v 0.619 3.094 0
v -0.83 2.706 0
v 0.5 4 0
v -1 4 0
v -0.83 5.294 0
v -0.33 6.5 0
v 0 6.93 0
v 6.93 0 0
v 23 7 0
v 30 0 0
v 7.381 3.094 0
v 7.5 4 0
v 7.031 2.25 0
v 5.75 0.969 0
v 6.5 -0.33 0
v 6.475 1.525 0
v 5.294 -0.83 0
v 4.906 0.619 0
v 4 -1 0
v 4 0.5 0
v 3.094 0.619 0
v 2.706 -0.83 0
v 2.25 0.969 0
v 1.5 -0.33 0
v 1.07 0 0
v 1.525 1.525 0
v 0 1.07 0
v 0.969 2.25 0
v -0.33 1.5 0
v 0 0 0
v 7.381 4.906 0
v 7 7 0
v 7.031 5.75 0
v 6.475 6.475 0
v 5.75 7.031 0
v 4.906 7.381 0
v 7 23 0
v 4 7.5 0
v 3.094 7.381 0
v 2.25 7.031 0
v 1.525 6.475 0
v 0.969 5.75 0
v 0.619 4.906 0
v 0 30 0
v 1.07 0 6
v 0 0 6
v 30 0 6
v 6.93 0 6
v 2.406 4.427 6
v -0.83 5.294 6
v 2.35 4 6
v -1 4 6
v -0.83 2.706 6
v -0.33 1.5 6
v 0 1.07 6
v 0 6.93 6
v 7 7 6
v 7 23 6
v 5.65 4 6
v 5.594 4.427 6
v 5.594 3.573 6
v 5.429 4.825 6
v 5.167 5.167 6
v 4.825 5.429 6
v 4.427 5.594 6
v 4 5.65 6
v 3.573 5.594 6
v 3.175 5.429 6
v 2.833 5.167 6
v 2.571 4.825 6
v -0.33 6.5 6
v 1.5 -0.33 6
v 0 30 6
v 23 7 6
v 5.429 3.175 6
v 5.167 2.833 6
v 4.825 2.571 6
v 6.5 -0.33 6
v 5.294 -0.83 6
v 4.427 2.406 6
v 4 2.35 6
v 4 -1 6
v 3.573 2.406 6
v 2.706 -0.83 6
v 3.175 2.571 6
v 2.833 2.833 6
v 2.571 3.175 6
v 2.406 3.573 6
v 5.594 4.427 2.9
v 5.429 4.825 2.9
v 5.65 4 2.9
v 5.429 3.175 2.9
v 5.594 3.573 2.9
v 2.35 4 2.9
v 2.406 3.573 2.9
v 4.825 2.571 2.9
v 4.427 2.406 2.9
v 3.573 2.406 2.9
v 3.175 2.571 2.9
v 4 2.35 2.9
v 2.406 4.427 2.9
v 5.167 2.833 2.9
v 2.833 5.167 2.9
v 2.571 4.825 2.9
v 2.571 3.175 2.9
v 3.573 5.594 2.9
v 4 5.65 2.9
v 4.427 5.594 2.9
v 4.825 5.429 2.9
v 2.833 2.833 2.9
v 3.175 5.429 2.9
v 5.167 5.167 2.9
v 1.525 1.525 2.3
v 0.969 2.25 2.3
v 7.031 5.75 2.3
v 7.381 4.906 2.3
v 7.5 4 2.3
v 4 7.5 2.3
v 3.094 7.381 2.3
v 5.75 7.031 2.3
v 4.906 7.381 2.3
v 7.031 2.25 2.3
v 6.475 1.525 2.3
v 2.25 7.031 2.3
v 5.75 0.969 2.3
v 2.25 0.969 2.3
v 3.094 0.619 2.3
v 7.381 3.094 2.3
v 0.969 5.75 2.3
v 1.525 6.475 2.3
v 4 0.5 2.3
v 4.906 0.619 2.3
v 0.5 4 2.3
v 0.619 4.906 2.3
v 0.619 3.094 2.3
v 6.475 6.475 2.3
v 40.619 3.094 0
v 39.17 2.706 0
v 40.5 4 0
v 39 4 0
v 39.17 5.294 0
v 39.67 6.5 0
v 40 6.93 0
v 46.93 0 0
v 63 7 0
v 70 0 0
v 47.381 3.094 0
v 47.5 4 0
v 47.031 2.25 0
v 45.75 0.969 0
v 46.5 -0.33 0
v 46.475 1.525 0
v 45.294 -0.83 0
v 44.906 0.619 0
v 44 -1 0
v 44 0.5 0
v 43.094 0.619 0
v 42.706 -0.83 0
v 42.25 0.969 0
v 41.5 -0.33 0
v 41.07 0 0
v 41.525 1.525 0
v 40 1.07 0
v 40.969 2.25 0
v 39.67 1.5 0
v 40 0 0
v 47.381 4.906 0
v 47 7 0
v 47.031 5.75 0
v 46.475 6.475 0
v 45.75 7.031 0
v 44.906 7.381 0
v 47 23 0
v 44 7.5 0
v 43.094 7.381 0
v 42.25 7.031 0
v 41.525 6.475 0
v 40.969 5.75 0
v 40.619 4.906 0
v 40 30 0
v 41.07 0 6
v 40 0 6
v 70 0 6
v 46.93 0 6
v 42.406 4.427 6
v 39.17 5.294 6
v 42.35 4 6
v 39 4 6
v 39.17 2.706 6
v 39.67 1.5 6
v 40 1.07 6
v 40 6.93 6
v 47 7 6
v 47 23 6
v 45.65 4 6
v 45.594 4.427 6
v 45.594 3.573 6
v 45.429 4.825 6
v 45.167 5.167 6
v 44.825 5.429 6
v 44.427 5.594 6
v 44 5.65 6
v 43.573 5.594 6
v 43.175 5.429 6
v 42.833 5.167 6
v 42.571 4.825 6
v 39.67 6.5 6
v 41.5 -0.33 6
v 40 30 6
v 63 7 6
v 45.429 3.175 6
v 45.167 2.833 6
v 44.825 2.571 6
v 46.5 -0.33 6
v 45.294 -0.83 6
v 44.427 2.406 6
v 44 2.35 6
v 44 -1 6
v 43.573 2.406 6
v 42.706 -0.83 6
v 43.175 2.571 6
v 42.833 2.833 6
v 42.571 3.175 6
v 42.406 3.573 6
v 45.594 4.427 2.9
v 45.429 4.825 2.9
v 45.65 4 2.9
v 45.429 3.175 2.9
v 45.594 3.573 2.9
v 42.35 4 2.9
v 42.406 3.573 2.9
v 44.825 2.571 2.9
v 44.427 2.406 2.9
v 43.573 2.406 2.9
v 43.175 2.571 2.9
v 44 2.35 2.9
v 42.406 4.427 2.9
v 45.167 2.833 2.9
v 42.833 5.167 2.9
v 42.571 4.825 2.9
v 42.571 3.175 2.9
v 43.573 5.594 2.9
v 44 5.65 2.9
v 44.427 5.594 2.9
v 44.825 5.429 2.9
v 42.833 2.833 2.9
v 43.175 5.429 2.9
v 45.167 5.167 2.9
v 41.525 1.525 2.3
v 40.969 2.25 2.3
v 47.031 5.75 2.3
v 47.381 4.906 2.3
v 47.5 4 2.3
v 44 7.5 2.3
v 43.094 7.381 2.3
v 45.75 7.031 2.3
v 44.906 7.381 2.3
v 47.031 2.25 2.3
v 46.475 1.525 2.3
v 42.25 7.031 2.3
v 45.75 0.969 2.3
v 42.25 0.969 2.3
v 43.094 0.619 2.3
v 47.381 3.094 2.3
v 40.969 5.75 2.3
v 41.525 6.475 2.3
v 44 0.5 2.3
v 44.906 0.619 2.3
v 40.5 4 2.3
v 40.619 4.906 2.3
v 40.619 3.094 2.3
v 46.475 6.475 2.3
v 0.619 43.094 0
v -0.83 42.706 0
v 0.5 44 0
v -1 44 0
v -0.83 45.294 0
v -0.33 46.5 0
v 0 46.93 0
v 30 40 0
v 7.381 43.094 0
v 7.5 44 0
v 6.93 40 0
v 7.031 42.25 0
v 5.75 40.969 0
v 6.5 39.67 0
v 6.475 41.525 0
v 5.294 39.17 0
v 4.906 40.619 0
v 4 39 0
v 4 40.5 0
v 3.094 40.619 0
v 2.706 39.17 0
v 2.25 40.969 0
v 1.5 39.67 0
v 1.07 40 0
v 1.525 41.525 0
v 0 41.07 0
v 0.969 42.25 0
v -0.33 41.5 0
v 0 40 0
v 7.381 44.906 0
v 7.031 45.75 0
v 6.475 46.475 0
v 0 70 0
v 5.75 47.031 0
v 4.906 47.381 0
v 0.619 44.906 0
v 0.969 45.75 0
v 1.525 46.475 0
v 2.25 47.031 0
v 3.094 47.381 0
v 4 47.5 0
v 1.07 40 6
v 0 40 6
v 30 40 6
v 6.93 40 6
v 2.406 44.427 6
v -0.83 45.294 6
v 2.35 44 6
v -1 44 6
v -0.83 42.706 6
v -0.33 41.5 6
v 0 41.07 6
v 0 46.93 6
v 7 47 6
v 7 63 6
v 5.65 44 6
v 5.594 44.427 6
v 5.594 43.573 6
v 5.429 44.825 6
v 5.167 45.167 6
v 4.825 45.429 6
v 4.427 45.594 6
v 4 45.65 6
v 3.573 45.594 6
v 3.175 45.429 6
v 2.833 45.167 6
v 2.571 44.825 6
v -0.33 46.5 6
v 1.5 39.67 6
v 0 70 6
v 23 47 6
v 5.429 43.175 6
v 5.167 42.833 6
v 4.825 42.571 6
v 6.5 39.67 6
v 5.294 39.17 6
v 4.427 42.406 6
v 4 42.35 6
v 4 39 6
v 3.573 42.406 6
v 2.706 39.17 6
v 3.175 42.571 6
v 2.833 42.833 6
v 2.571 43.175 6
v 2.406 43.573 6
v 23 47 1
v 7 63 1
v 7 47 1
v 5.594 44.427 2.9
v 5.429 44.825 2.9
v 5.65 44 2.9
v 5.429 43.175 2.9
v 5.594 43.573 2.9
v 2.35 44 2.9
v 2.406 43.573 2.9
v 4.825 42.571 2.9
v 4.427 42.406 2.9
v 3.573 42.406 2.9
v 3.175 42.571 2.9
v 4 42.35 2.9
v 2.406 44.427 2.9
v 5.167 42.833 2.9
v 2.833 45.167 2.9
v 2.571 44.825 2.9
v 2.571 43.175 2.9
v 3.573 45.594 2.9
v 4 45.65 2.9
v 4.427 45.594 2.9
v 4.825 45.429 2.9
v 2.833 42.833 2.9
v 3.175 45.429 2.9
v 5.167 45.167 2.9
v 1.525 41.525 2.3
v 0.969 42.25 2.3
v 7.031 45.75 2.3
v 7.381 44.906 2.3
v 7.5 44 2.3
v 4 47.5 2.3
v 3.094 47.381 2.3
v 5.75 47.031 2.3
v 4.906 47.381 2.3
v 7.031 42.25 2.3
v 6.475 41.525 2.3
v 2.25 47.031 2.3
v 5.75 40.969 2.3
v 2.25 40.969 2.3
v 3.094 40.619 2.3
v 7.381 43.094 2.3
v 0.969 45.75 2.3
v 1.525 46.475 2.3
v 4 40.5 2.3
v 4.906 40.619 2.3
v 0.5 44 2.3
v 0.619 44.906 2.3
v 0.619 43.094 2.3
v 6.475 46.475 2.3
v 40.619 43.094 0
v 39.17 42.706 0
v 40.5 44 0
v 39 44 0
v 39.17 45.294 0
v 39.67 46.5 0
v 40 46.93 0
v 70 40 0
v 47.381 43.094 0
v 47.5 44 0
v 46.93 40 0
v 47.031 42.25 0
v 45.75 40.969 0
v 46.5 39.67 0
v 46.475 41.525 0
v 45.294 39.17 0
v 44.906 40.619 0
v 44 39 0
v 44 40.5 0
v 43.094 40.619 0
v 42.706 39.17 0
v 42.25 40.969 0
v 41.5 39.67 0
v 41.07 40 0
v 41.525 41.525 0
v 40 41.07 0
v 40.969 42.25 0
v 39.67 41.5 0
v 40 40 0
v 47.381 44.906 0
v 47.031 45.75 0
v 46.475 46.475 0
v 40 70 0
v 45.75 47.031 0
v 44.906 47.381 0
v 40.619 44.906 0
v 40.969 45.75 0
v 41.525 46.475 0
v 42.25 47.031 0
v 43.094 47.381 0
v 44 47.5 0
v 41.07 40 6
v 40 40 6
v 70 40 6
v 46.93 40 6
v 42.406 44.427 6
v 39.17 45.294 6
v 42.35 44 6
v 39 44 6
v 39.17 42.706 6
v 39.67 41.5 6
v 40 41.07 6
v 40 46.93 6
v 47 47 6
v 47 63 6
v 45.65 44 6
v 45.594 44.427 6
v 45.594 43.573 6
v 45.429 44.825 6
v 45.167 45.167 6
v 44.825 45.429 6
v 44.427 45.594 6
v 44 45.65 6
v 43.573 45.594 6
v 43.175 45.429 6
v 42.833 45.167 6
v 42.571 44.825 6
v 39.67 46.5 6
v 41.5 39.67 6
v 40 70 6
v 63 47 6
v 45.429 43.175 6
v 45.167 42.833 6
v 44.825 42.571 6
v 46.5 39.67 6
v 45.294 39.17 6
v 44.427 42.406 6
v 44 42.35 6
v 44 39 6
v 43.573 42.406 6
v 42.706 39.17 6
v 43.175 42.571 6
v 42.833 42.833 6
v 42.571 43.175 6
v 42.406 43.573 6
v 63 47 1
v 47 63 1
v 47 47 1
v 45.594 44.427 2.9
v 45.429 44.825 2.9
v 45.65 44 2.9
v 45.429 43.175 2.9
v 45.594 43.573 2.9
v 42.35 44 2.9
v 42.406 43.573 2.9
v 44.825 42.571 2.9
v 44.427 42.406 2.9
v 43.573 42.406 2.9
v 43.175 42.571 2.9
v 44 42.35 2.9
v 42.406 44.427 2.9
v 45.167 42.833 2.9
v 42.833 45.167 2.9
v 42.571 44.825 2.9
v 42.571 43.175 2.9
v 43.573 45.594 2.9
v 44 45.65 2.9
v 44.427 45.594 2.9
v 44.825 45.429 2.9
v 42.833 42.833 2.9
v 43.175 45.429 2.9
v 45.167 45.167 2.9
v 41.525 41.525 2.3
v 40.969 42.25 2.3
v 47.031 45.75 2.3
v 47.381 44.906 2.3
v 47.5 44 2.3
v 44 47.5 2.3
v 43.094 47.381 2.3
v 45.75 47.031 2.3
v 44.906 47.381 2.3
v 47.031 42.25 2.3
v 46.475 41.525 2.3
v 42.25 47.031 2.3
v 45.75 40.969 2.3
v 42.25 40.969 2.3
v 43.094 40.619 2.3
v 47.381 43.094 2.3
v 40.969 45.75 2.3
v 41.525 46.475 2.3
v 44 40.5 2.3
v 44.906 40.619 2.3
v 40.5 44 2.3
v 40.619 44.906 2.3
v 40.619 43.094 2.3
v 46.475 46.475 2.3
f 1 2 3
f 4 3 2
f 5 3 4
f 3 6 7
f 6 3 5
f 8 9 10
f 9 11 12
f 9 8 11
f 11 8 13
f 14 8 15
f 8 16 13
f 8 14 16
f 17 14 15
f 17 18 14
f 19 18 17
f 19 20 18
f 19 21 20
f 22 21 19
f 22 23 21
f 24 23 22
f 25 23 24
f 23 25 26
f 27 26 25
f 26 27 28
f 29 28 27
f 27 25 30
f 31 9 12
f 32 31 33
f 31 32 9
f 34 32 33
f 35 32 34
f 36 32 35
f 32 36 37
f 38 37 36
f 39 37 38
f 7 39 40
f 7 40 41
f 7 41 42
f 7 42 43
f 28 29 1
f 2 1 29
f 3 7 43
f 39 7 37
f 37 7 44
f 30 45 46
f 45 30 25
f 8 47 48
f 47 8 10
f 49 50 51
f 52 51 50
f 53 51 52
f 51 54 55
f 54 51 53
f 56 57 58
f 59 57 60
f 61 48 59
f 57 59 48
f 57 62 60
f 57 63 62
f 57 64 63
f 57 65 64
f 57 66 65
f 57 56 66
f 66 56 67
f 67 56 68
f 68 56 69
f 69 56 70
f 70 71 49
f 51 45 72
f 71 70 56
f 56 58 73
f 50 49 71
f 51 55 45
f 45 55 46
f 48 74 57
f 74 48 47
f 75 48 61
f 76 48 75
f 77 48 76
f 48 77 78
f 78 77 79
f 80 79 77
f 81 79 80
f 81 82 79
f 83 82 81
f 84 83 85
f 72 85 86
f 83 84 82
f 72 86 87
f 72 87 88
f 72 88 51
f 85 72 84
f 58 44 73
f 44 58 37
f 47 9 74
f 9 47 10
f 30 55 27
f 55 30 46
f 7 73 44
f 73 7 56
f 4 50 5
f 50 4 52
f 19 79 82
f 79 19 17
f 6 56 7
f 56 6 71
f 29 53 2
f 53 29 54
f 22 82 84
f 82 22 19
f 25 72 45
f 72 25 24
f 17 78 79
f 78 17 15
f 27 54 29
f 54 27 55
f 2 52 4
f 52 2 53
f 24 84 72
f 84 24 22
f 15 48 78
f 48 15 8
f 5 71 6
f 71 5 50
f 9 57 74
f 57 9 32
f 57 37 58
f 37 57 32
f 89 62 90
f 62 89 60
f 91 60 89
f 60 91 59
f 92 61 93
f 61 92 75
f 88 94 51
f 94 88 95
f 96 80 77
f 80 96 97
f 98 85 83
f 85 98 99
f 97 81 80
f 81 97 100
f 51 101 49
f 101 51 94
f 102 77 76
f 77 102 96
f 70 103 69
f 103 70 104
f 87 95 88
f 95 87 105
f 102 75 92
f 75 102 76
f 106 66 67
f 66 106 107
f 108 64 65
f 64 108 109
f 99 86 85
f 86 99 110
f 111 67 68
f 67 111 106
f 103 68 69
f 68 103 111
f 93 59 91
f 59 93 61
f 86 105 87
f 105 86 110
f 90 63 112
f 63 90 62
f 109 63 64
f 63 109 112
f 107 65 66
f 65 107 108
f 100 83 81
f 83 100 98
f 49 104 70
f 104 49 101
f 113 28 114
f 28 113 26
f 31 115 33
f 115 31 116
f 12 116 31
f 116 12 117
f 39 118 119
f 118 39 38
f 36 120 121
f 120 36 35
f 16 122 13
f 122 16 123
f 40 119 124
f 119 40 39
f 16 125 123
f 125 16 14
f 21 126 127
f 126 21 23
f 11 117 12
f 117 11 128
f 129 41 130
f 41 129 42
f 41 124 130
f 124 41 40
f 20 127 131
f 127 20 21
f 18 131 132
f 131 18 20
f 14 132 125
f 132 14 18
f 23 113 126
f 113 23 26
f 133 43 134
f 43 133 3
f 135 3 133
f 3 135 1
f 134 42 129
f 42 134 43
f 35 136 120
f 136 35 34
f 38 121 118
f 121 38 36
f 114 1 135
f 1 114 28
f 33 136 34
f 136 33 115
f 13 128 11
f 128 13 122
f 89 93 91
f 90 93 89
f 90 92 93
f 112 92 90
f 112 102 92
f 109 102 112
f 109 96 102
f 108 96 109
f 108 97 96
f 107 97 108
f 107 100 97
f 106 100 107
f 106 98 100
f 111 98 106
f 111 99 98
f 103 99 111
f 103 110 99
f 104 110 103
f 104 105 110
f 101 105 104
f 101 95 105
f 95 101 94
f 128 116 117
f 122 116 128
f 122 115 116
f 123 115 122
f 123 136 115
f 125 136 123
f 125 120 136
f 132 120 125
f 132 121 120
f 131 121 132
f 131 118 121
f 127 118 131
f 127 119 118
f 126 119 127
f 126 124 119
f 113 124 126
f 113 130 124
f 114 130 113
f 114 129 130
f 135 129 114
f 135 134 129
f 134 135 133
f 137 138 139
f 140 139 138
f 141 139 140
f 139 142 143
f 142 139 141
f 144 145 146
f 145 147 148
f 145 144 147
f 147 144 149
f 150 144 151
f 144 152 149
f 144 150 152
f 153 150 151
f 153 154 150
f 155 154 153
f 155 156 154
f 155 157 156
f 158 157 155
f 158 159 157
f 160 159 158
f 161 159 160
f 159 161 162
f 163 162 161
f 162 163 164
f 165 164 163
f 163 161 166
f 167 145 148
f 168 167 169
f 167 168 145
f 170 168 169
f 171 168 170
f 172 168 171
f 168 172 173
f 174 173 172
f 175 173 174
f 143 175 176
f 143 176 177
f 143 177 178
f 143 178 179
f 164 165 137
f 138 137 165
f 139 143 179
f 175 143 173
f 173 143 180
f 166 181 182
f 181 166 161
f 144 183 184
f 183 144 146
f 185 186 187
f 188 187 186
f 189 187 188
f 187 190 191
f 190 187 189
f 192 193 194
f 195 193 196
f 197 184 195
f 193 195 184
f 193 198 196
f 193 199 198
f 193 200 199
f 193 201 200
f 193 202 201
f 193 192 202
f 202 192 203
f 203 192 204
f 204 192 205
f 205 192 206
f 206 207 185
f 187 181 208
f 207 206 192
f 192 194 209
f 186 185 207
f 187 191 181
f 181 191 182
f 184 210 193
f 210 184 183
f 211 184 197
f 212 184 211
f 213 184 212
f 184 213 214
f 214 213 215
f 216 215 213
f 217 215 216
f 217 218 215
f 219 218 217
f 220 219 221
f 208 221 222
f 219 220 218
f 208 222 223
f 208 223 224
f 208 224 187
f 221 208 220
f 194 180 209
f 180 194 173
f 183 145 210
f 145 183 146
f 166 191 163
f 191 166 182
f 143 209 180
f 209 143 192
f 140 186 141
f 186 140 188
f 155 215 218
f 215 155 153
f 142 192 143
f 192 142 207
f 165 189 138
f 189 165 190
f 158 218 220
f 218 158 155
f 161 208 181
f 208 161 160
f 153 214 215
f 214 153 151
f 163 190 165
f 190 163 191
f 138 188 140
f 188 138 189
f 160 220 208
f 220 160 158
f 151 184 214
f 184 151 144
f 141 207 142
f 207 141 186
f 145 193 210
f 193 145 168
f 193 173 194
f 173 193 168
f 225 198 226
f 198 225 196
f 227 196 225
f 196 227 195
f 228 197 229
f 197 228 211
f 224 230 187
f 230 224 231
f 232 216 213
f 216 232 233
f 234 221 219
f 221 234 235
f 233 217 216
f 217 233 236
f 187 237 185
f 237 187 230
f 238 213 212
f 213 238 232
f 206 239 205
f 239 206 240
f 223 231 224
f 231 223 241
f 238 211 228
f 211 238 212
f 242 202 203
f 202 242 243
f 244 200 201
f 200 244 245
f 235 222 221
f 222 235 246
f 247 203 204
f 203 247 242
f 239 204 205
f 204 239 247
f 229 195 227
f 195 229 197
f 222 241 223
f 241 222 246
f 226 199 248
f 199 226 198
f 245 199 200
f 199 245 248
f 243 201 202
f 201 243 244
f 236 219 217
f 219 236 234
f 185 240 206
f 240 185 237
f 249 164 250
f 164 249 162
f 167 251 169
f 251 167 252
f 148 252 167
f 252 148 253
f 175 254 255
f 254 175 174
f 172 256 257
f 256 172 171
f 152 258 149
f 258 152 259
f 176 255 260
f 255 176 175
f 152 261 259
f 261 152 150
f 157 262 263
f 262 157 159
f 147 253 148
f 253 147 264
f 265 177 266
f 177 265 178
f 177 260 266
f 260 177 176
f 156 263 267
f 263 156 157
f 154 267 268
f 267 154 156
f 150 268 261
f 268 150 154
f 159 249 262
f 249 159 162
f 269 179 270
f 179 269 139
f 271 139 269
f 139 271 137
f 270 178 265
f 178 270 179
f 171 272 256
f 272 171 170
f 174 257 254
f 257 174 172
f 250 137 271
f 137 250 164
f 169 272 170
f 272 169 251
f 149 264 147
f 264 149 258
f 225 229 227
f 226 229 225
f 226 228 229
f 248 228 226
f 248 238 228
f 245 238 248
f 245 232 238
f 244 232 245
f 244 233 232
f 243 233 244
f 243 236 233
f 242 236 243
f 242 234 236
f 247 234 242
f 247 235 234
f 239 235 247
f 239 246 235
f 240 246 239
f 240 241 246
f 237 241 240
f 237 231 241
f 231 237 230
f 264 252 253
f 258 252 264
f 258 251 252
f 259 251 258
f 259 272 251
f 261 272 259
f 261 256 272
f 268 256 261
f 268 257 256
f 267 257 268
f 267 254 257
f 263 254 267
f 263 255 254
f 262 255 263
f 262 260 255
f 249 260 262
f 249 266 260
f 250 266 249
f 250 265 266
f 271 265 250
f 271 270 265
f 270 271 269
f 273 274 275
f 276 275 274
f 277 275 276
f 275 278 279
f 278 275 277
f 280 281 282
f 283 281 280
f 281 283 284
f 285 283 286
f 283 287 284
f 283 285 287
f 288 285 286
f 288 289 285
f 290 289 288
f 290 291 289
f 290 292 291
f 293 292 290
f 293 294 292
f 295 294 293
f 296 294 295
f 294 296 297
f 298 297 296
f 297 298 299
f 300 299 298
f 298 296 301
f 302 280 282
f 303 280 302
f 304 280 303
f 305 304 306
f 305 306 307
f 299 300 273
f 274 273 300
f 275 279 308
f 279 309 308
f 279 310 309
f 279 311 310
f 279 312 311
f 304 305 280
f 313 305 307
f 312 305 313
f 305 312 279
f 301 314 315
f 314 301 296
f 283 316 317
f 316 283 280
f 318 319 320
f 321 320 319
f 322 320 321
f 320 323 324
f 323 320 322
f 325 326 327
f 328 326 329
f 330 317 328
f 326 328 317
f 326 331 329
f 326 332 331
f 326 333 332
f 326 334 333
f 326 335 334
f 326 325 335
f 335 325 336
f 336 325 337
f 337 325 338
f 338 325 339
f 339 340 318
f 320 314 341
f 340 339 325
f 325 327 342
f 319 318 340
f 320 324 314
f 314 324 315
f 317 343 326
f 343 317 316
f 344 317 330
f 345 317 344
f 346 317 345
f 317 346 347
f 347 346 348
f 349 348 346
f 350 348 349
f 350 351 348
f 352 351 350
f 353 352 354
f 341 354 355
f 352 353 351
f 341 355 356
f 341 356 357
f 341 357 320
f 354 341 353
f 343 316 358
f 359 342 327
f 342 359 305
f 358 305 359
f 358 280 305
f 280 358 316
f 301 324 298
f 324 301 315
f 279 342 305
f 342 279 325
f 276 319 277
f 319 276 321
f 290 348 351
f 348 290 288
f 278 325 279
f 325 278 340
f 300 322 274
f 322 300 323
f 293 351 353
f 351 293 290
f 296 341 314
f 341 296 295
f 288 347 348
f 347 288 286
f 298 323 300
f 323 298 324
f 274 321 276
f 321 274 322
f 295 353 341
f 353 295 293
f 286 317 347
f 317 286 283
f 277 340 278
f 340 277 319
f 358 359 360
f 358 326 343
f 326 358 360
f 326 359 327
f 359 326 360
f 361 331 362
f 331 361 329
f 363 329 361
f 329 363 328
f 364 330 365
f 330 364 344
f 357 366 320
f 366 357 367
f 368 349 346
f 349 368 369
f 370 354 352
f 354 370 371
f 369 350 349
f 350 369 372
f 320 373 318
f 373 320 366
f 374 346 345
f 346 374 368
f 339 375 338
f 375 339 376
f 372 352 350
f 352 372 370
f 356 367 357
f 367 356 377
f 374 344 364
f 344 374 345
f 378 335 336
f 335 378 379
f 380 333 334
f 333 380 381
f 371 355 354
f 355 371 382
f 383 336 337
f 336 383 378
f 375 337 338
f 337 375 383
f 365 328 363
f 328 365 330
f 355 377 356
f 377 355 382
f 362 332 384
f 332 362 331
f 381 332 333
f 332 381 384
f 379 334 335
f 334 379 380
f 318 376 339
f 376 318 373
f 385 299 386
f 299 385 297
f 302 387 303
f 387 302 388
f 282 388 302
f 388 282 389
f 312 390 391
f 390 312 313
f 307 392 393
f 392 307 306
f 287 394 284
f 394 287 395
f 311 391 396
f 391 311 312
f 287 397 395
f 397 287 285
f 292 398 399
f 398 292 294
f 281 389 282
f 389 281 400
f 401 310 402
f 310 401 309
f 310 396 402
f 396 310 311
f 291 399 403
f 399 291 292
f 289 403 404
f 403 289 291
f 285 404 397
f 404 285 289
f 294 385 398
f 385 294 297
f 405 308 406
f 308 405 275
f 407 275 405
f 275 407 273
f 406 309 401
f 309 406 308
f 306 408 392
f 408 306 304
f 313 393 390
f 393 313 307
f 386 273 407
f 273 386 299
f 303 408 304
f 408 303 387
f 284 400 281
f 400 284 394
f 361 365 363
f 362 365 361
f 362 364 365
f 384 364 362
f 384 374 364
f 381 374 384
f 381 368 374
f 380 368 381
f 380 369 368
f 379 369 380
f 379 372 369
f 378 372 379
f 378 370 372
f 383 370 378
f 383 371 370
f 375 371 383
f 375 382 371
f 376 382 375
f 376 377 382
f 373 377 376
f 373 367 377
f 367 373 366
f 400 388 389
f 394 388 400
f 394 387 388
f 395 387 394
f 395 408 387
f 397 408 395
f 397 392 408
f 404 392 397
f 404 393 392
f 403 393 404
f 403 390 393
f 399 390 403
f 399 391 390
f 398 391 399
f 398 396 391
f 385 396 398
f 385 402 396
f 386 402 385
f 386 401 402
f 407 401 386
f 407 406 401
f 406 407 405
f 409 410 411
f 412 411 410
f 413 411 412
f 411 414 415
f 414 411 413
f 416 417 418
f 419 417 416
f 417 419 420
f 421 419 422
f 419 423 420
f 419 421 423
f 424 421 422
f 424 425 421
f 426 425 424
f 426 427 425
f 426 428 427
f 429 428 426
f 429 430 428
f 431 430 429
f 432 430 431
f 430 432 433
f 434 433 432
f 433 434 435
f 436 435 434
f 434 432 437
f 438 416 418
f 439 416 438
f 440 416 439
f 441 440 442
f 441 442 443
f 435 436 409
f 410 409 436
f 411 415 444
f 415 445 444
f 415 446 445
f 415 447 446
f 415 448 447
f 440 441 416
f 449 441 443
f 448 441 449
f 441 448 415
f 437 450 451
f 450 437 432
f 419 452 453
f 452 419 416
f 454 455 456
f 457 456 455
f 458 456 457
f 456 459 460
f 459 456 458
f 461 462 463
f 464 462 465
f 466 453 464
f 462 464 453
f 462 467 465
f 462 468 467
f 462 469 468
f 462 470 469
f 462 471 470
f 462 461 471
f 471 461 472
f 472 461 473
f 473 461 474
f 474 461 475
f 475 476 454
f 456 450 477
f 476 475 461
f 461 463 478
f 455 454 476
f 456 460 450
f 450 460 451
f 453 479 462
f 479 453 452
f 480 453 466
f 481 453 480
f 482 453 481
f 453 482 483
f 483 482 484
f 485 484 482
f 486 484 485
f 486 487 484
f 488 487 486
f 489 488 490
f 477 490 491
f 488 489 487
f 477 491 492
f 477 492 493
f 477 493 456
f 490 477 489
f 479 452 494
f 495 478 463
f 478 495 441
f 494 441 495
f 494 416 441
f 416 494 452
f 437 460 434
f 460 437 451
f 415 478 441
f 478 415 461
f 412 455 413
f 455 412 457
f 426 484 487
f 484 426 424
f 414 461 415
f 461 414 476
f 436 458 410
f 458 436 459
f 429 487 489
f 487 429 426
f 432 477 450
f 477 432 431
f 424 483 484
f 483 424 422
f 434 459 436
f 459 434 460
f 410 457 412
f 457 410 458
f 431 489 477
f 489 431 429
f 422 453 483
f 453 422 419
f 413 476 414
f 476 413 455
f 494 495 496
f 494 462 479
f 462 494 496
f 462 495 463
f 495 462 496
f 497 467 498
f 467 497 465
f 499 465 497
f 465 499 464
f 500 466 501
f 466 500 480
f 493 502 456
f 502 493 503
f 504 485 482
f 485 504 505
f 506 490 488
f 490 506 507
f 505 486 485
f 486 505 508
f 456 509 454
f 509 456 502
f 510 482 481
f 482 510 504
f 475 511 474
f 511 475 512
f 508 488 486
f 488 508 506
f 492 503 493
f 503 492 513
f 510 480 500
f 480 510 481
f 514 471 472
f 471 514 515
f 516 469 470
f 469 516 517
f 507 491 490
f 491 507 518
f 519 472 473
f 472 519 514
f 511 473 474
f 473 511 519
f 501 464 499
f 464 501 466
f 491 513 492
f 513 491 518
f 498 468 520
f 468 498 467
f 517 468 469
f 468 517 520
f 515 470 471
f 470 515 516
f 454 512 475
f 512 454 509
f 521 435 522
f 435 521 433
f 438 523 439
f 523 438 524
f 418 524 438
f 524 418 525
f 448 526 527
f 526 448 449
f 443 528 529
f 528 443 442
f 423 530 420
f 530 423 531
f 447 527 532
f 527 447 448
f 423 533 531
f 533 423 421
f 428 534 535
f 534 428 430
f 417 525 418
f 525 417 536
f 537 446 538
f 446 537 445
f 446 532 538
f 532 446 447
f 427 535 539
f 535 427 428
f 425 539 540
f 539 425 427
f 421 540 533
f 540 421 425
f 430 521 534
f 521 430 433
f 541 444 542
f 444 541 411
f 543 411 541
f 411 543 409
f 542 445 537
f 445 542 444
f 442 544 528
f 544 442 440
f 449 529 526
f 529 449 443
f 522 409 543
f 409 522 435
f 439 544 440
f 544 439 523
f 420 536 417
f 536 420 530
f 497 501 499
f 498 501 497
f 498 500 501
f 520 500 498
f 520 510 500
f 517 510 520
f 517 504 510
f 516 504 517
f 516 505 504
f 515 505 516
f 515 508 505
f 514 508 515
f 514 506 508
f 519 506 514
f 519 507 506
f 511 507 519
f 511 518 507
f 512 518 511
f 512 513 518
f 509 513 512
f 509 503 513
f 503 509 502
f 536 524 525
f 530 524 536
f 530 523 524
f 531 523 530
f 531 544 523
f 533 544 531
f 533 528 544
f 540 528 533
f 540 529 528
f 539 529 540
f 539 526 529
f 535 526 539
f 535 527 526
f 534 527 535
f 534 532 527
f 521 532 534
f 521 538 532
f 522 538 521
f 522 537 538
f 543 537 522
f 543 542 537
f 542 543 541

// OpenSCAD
/*
	Glass plate holder
	By Humberto Kelkboom
	Lark3D.nl
	
	Changed: Inserted adjustable side thikness.
	
	Changed: inserted glass height and lowerd screw
*/

//The width of the triange
WidthOffTriagle=30;
//The width of the Sides
WithOffSides = 7;
//height of the glassplate
height = 6;

module triangle(width,length,h)
{
	linear_extrude(height=h) 
	polygon([[0,0],[0,width],[length,0]]);
}

module PlateHolder(OOC){
union(){
difference(){
union(){
triangle(WidthOffTriagle,WidthOffTriagle,height);
translate([4,4,height/2])cylinder(r=5, h=height, center=true,$fn=24);
}
translate([WithOffSides,WithOffSides,(OOC=="open"?-0.5:1)])triangle(WidthOffTriagle,WidthOffTriagle,height+2);
translate([4,4,height/2])cylinder(r=1.65, h=height, center=true,$fn=24);
translate([4,4,1.2])cylinder(r=3.5, h=2.4, center=true,$fn=24);
}
translate([4,4,2.6])cylinder(r=4, h=0.6, center=true,$fn=24);
}
};

PlateHolder("open");

translate([WidthOffTriagle +10,0,0])PlateHolder("open");
translate([0,WidthOffTriagle +10,0])PlateHolder("close");
translate([WidthOffTriagle +10,WidthOffTriagle +10,0])PlateHolder("close");
